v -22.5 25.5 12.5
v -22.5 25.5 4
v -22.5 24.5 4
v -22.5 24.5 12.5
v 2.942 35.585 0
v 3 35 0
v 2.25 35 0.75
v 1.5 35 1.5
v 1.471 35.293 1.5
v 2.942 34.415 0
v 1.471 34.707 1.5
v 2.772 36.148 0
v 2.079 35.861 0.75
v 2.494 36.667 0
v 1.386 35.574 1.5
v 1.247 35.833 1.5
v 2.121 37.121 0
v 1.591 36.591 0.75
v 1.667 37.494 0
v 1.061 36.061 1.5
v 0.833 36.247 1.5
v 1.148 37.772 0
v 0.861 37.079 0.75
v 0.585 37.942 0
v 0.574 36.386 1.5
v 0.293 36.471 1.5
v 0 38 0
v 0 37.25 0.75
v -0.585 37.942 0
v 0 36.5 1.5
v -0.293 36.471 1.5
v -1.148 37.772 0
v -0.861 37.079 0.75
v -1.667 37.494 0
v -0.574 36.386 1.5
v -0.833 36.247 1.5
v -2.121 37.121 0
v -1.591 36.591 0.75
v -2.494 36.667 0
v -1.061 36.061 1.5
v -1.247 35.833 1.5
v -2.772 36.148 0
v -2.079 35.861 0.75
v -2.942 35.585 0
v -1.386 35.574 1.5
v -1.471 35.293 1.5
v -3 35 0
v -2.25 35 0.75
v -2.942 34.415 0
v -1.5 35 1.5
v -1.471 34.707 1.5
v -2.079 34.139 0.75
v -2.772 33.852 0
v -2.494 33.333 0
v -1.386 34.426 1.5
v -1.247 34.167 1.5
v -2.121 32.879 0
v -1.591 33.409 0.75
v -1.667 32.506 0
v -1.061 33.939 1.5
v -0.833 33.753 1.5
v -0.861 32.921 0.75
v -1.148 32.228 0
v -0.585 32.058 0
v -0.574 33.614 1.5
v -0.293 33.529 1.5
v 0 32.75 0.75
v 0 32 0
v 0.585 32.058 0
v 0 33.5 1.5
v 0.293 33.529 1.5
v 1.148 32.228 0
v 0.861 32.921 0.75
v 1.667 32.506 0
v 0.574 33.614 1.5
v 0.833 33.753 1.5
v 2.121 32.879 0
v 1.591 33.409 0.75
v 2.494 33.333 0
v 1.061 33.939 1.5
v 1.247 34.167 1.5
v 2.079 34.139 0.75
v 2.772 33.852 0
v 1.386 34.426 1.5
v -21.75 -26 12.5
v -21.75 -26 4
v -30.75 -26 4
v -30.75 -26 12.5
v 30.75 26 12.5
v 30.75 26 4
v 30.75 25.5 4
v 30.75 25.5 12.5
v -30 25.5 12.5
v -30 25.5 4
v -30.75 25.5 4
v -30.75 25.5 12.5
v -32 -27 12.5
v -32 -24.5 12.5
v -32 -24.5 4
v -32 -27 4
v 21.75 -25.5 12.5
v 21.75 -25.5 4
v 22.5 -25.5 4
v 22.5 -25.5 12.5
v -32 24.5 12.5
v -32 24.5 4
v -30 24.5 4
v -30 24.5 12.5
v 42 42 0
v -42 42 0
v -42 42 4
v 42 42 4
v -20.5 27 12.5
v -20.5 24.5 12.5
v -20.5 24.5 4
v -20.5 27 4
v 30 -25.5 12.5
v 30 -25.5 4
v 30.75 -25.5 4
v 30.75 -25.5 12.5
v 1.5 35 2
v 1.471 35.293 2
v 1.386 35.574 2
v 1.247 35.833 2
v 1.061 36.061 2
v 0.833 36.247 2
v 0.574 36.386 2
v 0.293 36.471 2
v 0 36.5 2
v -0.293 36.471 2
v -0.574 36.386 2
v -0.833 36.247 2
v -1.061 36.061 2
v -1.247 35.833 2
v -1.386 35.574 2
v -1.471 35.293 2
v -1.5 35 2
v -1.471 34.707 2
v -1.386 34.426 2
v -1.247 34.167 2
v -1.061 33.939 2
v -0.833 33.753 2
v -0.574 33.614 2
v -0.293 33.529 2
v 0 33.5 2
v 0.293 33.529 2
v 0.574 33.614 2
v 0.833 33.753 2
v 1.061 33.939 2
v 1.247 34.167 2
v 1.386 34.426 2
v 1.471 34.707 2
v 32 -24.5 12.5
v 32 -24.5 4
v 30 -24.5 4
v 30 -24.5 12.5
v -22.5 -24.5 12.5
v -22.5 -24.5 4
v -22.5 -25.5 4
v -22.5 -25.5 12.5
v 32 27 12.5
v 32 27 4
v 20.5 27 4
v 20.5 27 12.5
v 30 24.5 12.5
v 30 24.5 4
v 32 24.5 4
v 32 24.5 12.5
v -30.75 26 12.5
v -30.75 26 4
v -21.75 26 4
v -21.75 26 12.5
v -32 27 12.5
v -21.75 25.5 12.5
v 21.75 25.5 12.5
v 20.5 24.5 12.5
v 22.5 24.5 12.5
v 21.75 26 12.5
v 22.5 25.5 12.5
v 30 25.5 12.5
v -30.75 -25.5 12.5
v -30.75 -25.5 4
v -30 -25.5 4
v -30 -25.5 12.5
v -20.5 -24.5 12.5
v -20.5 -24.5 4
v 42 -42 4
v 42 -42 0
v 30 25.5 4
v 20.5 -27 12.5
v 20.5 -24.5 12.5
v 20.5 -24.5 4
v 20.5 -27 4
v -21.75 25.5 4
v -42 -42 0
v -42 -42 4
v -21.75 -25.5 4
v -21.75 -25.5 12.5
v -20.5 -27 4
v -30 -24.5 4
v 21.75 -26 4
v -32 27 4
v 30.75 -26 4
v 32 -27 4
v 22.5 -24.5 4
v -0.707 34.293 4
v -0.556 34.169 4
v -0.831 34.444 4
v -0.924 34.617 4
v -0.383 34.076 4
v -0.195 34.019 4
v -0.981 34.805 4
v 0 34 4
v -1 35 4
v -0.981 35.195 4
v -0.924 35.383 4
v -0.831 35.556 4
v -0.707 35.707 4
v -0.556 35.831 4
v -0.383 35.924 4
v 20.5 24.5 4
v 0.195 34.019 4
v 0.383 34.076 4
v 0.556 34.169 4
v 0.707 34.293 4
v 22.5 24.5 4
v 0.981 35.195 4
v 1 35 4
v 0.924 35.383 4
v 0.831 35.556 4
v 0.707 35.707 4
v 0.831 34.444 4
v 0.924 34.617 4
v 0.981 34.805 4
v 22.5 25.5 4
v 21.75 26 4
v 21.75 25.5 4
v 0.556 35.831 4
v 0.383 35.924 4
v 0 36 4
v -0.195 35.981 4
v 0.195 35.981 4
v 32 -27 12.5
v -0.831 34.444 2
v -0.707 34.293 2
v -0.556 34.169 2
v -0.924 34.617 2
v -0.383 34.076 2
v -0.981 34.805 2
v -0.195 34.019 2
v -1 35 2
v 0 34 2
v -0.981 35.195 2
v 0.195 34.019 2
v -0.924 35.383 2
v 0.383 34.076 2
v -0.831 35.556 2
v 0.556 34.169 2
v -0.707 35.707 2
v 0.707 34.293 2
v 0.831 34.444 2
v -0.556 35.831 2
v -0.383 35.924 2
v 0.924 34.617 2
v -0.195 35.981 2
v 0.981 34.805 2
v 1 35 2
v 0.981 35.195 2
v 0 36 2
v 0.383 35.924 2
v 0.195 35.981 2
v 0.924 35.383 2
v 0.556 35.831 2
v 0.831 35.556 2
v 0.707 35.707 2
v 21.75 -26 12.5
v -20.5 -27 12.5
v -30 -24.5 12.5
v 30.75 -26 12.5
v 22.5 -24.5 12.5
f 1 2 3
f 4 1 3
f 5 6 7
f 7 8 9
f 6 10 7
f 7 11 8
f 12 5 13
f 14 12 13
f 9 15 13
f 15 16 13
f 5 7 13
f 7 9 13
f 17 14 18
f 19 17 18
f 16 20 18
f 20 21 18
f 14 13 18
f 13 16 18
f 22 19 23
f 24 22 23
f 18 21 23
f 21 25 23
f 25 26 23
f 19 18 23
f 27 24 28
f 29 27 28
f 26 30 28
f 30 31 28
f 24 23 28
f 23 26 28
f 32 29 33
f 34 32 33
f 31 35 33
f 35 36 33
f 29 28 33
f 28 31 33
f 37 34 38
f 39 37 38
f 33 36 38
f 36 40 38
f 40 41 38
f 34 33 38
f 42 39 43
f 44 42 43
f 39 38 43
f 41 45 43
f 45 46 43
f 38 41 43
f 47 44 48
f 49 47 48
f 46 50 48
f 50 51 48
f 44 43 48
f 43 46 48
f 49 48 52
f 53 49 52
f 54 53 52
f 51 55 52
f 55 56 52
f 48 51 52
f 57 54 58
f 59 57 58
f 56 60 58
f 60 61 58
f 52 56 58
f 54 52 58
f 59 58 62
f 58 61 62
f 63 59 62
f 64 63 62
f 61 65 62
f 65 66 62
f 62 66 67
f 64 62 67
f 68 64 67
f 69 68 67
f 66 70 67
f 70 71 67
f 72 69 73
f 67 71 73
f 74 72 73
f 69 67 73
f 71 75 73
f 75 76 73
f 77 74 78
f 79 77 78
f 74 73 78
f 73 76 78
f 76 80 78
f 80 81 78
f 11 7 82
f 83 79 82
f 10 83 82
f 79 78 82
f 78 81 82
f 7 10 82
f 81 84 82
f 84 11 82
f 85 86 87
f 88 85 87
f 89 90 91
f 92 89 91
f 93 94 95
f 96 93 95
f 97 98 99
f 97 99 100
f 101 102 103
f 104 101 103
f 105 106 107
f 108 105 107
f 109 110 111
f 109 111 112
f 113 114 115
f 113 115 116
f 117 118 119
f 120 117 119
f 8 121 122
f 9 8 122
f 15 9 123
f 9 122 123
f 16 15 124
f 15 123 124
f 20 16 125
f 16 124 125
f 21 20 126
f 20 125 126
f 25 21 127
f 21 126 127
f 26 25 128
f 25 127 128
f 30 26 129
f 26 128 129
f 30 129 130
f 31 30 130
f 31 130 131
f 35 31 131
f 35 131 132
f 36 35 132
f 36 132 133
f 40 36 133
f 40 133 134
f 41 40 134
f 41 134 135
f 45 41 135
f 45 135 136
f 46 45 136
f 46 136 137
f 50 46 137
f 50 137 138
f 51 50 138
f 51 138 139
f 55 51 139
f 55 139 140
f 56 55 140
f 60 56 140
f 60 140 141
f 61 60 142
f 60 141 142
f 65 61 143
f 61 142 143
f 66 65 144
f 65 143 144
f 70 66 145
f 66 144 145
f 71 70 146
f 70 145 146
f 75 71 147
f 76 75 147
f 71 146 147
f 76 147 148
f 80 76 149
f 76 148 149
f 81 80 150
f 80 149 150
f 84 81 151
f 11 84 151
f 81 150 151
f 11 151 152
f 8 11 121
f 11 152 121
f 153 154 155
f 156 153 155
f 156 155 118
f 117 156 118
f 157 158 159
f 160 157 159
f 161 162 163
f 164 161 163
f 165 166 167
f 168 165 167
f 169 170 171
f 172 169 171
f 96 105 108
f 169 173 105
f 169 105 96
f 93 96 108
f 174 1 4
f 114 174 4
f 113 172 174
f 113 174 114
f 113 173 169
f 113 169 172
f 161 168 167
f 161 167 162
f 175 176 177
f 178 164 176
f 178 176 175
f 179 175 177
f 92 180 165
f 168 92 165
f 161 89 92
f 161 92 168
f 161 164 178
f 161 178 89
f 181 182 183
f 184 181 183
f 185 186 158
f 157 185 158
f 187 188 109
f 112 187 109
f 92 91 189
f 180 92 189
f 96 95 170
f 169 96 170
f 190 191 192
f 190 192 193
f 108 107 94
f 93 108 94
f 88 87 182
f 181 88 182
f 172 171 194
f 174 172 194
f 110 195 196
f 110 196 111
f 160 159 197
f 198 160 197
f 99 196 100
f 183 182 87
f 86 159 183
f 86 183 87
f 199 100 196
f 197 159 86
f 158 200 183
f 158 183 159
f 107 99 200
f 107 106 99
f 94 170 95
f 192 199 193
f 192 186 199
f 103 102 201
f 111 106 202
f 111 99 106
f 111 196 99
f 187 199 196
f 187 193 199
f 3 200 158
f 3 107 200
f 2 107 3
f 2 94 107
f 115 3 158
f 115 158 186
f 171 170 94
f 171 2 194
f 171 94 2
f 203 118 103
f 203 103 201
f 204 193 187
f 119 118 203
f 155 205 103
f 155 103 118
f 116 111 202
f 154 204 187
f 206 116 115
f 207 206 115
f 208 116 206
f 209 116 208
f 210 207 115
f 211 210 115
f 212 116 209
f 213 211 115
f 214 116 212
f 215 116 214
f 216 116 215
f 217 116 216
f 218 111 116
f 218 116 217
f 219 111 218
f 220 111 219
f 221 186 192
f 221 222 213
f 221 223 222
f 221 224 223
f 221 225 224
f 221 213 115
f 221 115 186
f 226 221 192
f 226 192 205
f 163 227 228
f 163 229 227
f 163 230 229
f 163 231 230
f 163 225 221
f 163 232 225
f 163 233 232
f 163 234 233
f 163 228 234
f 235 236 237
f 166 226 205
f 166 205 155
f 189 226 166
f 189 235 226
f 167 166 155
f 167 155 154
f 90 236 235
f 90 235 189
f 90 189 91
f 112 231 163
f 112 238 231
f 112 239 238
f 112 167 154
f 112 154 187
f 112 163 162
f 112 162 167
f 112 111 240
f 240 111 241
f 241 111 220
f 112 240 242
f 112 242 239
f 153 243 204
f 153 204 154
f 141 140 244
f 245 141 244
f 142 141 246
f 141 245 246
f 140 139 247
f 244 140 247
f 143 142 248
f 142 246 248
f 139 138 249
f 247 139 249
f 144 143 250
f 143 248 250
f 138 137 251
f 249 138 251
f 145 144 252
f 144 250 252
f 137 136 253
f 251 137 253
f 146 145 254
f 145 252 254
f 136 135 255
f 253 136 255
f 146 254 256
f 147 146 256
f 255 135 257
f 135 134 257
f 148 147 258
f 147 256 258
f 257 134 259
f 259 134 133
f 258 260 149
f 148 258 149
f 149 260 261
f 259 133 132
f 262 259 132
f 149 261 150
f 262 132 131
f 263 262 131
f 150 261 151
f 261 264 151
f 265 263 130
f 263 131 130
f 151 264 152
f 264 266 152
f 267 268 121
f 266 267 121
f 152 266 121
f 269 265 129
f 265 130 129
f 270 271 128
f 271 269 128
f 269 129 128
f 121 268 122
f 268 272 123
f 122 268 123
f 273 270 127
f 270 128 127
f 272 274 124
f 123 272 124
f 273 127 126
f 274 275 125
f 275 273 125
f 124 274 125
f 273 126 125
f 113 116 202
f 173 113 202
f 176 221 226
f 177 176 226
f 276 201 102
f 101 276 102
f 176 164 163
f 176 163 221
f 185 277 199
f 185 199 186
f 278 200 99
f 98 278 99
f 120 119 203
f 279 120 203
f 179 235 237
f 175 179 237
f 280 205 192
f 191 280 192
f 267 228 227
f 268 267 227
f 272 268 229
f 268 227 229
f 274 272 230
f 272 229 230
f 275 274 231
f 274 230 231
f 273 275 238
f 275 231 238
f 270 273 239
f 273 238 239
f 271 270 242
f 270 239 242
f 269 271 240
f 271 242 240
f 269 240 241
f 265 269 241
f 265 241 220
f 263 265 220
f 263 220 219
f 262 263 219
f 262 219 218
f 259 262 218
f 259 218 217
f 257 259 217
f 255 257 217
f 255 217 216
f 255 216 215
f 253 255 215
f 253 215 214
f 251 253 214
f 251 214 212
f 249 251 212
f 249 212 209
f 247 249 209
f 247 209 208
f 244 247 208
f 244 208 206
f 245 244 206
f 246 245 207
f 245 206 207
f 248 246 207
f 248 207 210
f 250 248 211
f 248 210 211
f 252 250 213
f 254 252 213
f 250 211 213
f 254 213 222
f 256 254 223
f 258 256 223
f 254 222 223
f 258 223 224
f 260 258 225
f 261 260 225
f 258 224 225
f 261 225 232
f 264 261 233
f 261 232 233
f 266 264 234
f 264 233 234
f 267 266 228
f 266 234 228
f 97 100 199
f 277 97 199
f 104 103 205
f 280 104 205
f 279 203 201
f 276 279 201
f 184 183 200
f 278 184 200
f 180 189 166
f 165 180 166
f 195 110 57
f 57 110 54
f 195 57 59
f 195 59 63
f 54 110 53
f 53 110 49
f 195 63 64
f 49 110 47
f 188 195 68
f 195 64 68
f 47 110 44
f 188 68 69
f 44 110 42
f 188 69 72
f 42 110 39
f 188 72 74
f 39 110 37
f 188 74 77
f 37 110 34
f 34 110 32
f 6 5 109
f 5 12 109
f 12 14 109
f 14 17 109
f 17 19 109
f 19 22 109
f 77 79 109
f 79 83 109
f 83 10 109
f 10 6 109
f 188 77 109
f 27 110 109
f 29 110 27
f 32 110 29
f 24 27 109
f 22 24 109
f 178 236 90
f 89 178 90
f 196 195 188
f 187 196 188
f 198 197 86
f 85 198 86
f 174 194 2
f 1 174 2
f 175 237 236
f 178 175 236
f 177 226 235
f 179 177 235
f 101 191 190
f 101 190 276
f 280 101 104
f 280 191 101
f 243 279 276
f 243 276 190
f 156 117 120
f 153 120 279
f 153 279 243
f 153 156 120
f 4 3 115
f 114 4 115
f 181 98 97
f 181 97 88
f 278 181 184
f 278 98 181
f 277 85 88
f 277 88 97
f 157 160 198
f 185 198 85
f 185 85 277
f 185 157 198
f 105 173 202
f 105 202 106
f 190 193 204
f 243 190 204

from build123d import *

# Parameters (mm, degrees)
F0_W     = 84
F0_H     = 84
F1_DEPTH = 4
F2_W     = 7.5
F2_H     = 1
F3_DEPTH = 8.5
F4_R     = 1
F5_DEPTH = 25
F6_START = -2
F4_R_2   = 1.5
F6_DEPTH = 23
F7_SIZE  = 1.5


with BuildPart() as f1:
    # F0 (on Top) → F1 (new body)
    with BuildSketch(Plane.XY):
        Rectangle(F0_W, F0_H)
    extrude(amount=F1_DEPTH)

    # F2 (on face) → F3 (join)
    with BuildSketch(Plane.XY.offset(4)):
        Polygon((-30, 27), (-32, 27), (-32, 24.5), (-30, 24.5), (-30, 25.5), (-30.75, 25.5), (-30.75, 26), (-30, 26), align=None)
        with Locations((-26.25, 26.5)):
            Rectangle(F2_W, F2_H)
        Polygon((-20.5, 27), (-22.5, 27), (-22.5, 26), (-21.75, 26), (-21.75, 25.5), (-22.5, 25.5), (-22.5, 24.5), (-20.5, 24.5), align=None)
        Polygon((-32, -27), (-30, -27), (-30, -26), (-30.75, -26), (-30.75, -25.5), (-30, -25.5), (-30, -24.5), (-32, -24.5), align=None)
        with Locations((-26.25, -26.5)):
            Rectangle(F2_W, F2_H)
        Polygon((-22.5, -27), (-20.5, -27), (-20.5, -24.5), (-22.5, -24.5), (-22.5, -25.5), (-21.75, -25.5), (-21.75, -26), (-22.5, -26), align=None)
        Polygon((22.5, 27), (20.5, 27), (20.5, 24.5), (22.5, 24.5), (22.5, 25.5), (21.75, 25.5), (21.75, 26), (22.5, 26), align=None)
        with Locations((26.25, 26.5)):
            Rectangle(F2_W, F2_H)
        Polygon((32, 27), (30, 27), (30, 26), (30.75, 26), (30.75, 25.5), (30, 25.5), (30, 24.5), (32, 24.5), align=None)
        Polygon((20.5, -27), (22.5, -27), (22.5, -26), (21.75, -26), (21.75, -25.5), (22.5, -25.5), (22.5, -24.5), (20.5, -24.5), align=None)
        with Locations((26.25, -26.5)):
            Rectangle(F2_W, F2_H)
        Polygon((30, -27), (32, -27), (32, -24.5), (30, -24.5), (30, -25.5), (30.75, -25.5), (30.75, -26), (30, -26), align=None)
    extrude(amount=F3_DEPTH)

    # F4 (on face) → F5 (cut)
    with BuildSketch(Plane.XY.offset(4)):
        with Locations((0, 35)):
            Circle(F4_R)
    extrude(amount=-F5_DEPTH, mode=Mode.SUBTRACT)

    # F4 (on face) → F6 (cut)
    with BuildSketch(Plane.XY.offset(4).offset(F6_START)):
        with Locations((0, 35)):
            Circle(F4_R_2)
        with Locations((0, 35)):
            Circle(F4_R, mode=Mode.SUBTRACT)
    extrude(amount=-F6_DEPTH, mode=Mode.SUBTRACT)

    # F7
    f7_edges = [f1.edges().sort_by_distance(p)[0] for p in [
        (-1.5, 35, 0),
    ]]
    chamfer(f7_edges, length=F7_SIZE)


solid = f1.part
